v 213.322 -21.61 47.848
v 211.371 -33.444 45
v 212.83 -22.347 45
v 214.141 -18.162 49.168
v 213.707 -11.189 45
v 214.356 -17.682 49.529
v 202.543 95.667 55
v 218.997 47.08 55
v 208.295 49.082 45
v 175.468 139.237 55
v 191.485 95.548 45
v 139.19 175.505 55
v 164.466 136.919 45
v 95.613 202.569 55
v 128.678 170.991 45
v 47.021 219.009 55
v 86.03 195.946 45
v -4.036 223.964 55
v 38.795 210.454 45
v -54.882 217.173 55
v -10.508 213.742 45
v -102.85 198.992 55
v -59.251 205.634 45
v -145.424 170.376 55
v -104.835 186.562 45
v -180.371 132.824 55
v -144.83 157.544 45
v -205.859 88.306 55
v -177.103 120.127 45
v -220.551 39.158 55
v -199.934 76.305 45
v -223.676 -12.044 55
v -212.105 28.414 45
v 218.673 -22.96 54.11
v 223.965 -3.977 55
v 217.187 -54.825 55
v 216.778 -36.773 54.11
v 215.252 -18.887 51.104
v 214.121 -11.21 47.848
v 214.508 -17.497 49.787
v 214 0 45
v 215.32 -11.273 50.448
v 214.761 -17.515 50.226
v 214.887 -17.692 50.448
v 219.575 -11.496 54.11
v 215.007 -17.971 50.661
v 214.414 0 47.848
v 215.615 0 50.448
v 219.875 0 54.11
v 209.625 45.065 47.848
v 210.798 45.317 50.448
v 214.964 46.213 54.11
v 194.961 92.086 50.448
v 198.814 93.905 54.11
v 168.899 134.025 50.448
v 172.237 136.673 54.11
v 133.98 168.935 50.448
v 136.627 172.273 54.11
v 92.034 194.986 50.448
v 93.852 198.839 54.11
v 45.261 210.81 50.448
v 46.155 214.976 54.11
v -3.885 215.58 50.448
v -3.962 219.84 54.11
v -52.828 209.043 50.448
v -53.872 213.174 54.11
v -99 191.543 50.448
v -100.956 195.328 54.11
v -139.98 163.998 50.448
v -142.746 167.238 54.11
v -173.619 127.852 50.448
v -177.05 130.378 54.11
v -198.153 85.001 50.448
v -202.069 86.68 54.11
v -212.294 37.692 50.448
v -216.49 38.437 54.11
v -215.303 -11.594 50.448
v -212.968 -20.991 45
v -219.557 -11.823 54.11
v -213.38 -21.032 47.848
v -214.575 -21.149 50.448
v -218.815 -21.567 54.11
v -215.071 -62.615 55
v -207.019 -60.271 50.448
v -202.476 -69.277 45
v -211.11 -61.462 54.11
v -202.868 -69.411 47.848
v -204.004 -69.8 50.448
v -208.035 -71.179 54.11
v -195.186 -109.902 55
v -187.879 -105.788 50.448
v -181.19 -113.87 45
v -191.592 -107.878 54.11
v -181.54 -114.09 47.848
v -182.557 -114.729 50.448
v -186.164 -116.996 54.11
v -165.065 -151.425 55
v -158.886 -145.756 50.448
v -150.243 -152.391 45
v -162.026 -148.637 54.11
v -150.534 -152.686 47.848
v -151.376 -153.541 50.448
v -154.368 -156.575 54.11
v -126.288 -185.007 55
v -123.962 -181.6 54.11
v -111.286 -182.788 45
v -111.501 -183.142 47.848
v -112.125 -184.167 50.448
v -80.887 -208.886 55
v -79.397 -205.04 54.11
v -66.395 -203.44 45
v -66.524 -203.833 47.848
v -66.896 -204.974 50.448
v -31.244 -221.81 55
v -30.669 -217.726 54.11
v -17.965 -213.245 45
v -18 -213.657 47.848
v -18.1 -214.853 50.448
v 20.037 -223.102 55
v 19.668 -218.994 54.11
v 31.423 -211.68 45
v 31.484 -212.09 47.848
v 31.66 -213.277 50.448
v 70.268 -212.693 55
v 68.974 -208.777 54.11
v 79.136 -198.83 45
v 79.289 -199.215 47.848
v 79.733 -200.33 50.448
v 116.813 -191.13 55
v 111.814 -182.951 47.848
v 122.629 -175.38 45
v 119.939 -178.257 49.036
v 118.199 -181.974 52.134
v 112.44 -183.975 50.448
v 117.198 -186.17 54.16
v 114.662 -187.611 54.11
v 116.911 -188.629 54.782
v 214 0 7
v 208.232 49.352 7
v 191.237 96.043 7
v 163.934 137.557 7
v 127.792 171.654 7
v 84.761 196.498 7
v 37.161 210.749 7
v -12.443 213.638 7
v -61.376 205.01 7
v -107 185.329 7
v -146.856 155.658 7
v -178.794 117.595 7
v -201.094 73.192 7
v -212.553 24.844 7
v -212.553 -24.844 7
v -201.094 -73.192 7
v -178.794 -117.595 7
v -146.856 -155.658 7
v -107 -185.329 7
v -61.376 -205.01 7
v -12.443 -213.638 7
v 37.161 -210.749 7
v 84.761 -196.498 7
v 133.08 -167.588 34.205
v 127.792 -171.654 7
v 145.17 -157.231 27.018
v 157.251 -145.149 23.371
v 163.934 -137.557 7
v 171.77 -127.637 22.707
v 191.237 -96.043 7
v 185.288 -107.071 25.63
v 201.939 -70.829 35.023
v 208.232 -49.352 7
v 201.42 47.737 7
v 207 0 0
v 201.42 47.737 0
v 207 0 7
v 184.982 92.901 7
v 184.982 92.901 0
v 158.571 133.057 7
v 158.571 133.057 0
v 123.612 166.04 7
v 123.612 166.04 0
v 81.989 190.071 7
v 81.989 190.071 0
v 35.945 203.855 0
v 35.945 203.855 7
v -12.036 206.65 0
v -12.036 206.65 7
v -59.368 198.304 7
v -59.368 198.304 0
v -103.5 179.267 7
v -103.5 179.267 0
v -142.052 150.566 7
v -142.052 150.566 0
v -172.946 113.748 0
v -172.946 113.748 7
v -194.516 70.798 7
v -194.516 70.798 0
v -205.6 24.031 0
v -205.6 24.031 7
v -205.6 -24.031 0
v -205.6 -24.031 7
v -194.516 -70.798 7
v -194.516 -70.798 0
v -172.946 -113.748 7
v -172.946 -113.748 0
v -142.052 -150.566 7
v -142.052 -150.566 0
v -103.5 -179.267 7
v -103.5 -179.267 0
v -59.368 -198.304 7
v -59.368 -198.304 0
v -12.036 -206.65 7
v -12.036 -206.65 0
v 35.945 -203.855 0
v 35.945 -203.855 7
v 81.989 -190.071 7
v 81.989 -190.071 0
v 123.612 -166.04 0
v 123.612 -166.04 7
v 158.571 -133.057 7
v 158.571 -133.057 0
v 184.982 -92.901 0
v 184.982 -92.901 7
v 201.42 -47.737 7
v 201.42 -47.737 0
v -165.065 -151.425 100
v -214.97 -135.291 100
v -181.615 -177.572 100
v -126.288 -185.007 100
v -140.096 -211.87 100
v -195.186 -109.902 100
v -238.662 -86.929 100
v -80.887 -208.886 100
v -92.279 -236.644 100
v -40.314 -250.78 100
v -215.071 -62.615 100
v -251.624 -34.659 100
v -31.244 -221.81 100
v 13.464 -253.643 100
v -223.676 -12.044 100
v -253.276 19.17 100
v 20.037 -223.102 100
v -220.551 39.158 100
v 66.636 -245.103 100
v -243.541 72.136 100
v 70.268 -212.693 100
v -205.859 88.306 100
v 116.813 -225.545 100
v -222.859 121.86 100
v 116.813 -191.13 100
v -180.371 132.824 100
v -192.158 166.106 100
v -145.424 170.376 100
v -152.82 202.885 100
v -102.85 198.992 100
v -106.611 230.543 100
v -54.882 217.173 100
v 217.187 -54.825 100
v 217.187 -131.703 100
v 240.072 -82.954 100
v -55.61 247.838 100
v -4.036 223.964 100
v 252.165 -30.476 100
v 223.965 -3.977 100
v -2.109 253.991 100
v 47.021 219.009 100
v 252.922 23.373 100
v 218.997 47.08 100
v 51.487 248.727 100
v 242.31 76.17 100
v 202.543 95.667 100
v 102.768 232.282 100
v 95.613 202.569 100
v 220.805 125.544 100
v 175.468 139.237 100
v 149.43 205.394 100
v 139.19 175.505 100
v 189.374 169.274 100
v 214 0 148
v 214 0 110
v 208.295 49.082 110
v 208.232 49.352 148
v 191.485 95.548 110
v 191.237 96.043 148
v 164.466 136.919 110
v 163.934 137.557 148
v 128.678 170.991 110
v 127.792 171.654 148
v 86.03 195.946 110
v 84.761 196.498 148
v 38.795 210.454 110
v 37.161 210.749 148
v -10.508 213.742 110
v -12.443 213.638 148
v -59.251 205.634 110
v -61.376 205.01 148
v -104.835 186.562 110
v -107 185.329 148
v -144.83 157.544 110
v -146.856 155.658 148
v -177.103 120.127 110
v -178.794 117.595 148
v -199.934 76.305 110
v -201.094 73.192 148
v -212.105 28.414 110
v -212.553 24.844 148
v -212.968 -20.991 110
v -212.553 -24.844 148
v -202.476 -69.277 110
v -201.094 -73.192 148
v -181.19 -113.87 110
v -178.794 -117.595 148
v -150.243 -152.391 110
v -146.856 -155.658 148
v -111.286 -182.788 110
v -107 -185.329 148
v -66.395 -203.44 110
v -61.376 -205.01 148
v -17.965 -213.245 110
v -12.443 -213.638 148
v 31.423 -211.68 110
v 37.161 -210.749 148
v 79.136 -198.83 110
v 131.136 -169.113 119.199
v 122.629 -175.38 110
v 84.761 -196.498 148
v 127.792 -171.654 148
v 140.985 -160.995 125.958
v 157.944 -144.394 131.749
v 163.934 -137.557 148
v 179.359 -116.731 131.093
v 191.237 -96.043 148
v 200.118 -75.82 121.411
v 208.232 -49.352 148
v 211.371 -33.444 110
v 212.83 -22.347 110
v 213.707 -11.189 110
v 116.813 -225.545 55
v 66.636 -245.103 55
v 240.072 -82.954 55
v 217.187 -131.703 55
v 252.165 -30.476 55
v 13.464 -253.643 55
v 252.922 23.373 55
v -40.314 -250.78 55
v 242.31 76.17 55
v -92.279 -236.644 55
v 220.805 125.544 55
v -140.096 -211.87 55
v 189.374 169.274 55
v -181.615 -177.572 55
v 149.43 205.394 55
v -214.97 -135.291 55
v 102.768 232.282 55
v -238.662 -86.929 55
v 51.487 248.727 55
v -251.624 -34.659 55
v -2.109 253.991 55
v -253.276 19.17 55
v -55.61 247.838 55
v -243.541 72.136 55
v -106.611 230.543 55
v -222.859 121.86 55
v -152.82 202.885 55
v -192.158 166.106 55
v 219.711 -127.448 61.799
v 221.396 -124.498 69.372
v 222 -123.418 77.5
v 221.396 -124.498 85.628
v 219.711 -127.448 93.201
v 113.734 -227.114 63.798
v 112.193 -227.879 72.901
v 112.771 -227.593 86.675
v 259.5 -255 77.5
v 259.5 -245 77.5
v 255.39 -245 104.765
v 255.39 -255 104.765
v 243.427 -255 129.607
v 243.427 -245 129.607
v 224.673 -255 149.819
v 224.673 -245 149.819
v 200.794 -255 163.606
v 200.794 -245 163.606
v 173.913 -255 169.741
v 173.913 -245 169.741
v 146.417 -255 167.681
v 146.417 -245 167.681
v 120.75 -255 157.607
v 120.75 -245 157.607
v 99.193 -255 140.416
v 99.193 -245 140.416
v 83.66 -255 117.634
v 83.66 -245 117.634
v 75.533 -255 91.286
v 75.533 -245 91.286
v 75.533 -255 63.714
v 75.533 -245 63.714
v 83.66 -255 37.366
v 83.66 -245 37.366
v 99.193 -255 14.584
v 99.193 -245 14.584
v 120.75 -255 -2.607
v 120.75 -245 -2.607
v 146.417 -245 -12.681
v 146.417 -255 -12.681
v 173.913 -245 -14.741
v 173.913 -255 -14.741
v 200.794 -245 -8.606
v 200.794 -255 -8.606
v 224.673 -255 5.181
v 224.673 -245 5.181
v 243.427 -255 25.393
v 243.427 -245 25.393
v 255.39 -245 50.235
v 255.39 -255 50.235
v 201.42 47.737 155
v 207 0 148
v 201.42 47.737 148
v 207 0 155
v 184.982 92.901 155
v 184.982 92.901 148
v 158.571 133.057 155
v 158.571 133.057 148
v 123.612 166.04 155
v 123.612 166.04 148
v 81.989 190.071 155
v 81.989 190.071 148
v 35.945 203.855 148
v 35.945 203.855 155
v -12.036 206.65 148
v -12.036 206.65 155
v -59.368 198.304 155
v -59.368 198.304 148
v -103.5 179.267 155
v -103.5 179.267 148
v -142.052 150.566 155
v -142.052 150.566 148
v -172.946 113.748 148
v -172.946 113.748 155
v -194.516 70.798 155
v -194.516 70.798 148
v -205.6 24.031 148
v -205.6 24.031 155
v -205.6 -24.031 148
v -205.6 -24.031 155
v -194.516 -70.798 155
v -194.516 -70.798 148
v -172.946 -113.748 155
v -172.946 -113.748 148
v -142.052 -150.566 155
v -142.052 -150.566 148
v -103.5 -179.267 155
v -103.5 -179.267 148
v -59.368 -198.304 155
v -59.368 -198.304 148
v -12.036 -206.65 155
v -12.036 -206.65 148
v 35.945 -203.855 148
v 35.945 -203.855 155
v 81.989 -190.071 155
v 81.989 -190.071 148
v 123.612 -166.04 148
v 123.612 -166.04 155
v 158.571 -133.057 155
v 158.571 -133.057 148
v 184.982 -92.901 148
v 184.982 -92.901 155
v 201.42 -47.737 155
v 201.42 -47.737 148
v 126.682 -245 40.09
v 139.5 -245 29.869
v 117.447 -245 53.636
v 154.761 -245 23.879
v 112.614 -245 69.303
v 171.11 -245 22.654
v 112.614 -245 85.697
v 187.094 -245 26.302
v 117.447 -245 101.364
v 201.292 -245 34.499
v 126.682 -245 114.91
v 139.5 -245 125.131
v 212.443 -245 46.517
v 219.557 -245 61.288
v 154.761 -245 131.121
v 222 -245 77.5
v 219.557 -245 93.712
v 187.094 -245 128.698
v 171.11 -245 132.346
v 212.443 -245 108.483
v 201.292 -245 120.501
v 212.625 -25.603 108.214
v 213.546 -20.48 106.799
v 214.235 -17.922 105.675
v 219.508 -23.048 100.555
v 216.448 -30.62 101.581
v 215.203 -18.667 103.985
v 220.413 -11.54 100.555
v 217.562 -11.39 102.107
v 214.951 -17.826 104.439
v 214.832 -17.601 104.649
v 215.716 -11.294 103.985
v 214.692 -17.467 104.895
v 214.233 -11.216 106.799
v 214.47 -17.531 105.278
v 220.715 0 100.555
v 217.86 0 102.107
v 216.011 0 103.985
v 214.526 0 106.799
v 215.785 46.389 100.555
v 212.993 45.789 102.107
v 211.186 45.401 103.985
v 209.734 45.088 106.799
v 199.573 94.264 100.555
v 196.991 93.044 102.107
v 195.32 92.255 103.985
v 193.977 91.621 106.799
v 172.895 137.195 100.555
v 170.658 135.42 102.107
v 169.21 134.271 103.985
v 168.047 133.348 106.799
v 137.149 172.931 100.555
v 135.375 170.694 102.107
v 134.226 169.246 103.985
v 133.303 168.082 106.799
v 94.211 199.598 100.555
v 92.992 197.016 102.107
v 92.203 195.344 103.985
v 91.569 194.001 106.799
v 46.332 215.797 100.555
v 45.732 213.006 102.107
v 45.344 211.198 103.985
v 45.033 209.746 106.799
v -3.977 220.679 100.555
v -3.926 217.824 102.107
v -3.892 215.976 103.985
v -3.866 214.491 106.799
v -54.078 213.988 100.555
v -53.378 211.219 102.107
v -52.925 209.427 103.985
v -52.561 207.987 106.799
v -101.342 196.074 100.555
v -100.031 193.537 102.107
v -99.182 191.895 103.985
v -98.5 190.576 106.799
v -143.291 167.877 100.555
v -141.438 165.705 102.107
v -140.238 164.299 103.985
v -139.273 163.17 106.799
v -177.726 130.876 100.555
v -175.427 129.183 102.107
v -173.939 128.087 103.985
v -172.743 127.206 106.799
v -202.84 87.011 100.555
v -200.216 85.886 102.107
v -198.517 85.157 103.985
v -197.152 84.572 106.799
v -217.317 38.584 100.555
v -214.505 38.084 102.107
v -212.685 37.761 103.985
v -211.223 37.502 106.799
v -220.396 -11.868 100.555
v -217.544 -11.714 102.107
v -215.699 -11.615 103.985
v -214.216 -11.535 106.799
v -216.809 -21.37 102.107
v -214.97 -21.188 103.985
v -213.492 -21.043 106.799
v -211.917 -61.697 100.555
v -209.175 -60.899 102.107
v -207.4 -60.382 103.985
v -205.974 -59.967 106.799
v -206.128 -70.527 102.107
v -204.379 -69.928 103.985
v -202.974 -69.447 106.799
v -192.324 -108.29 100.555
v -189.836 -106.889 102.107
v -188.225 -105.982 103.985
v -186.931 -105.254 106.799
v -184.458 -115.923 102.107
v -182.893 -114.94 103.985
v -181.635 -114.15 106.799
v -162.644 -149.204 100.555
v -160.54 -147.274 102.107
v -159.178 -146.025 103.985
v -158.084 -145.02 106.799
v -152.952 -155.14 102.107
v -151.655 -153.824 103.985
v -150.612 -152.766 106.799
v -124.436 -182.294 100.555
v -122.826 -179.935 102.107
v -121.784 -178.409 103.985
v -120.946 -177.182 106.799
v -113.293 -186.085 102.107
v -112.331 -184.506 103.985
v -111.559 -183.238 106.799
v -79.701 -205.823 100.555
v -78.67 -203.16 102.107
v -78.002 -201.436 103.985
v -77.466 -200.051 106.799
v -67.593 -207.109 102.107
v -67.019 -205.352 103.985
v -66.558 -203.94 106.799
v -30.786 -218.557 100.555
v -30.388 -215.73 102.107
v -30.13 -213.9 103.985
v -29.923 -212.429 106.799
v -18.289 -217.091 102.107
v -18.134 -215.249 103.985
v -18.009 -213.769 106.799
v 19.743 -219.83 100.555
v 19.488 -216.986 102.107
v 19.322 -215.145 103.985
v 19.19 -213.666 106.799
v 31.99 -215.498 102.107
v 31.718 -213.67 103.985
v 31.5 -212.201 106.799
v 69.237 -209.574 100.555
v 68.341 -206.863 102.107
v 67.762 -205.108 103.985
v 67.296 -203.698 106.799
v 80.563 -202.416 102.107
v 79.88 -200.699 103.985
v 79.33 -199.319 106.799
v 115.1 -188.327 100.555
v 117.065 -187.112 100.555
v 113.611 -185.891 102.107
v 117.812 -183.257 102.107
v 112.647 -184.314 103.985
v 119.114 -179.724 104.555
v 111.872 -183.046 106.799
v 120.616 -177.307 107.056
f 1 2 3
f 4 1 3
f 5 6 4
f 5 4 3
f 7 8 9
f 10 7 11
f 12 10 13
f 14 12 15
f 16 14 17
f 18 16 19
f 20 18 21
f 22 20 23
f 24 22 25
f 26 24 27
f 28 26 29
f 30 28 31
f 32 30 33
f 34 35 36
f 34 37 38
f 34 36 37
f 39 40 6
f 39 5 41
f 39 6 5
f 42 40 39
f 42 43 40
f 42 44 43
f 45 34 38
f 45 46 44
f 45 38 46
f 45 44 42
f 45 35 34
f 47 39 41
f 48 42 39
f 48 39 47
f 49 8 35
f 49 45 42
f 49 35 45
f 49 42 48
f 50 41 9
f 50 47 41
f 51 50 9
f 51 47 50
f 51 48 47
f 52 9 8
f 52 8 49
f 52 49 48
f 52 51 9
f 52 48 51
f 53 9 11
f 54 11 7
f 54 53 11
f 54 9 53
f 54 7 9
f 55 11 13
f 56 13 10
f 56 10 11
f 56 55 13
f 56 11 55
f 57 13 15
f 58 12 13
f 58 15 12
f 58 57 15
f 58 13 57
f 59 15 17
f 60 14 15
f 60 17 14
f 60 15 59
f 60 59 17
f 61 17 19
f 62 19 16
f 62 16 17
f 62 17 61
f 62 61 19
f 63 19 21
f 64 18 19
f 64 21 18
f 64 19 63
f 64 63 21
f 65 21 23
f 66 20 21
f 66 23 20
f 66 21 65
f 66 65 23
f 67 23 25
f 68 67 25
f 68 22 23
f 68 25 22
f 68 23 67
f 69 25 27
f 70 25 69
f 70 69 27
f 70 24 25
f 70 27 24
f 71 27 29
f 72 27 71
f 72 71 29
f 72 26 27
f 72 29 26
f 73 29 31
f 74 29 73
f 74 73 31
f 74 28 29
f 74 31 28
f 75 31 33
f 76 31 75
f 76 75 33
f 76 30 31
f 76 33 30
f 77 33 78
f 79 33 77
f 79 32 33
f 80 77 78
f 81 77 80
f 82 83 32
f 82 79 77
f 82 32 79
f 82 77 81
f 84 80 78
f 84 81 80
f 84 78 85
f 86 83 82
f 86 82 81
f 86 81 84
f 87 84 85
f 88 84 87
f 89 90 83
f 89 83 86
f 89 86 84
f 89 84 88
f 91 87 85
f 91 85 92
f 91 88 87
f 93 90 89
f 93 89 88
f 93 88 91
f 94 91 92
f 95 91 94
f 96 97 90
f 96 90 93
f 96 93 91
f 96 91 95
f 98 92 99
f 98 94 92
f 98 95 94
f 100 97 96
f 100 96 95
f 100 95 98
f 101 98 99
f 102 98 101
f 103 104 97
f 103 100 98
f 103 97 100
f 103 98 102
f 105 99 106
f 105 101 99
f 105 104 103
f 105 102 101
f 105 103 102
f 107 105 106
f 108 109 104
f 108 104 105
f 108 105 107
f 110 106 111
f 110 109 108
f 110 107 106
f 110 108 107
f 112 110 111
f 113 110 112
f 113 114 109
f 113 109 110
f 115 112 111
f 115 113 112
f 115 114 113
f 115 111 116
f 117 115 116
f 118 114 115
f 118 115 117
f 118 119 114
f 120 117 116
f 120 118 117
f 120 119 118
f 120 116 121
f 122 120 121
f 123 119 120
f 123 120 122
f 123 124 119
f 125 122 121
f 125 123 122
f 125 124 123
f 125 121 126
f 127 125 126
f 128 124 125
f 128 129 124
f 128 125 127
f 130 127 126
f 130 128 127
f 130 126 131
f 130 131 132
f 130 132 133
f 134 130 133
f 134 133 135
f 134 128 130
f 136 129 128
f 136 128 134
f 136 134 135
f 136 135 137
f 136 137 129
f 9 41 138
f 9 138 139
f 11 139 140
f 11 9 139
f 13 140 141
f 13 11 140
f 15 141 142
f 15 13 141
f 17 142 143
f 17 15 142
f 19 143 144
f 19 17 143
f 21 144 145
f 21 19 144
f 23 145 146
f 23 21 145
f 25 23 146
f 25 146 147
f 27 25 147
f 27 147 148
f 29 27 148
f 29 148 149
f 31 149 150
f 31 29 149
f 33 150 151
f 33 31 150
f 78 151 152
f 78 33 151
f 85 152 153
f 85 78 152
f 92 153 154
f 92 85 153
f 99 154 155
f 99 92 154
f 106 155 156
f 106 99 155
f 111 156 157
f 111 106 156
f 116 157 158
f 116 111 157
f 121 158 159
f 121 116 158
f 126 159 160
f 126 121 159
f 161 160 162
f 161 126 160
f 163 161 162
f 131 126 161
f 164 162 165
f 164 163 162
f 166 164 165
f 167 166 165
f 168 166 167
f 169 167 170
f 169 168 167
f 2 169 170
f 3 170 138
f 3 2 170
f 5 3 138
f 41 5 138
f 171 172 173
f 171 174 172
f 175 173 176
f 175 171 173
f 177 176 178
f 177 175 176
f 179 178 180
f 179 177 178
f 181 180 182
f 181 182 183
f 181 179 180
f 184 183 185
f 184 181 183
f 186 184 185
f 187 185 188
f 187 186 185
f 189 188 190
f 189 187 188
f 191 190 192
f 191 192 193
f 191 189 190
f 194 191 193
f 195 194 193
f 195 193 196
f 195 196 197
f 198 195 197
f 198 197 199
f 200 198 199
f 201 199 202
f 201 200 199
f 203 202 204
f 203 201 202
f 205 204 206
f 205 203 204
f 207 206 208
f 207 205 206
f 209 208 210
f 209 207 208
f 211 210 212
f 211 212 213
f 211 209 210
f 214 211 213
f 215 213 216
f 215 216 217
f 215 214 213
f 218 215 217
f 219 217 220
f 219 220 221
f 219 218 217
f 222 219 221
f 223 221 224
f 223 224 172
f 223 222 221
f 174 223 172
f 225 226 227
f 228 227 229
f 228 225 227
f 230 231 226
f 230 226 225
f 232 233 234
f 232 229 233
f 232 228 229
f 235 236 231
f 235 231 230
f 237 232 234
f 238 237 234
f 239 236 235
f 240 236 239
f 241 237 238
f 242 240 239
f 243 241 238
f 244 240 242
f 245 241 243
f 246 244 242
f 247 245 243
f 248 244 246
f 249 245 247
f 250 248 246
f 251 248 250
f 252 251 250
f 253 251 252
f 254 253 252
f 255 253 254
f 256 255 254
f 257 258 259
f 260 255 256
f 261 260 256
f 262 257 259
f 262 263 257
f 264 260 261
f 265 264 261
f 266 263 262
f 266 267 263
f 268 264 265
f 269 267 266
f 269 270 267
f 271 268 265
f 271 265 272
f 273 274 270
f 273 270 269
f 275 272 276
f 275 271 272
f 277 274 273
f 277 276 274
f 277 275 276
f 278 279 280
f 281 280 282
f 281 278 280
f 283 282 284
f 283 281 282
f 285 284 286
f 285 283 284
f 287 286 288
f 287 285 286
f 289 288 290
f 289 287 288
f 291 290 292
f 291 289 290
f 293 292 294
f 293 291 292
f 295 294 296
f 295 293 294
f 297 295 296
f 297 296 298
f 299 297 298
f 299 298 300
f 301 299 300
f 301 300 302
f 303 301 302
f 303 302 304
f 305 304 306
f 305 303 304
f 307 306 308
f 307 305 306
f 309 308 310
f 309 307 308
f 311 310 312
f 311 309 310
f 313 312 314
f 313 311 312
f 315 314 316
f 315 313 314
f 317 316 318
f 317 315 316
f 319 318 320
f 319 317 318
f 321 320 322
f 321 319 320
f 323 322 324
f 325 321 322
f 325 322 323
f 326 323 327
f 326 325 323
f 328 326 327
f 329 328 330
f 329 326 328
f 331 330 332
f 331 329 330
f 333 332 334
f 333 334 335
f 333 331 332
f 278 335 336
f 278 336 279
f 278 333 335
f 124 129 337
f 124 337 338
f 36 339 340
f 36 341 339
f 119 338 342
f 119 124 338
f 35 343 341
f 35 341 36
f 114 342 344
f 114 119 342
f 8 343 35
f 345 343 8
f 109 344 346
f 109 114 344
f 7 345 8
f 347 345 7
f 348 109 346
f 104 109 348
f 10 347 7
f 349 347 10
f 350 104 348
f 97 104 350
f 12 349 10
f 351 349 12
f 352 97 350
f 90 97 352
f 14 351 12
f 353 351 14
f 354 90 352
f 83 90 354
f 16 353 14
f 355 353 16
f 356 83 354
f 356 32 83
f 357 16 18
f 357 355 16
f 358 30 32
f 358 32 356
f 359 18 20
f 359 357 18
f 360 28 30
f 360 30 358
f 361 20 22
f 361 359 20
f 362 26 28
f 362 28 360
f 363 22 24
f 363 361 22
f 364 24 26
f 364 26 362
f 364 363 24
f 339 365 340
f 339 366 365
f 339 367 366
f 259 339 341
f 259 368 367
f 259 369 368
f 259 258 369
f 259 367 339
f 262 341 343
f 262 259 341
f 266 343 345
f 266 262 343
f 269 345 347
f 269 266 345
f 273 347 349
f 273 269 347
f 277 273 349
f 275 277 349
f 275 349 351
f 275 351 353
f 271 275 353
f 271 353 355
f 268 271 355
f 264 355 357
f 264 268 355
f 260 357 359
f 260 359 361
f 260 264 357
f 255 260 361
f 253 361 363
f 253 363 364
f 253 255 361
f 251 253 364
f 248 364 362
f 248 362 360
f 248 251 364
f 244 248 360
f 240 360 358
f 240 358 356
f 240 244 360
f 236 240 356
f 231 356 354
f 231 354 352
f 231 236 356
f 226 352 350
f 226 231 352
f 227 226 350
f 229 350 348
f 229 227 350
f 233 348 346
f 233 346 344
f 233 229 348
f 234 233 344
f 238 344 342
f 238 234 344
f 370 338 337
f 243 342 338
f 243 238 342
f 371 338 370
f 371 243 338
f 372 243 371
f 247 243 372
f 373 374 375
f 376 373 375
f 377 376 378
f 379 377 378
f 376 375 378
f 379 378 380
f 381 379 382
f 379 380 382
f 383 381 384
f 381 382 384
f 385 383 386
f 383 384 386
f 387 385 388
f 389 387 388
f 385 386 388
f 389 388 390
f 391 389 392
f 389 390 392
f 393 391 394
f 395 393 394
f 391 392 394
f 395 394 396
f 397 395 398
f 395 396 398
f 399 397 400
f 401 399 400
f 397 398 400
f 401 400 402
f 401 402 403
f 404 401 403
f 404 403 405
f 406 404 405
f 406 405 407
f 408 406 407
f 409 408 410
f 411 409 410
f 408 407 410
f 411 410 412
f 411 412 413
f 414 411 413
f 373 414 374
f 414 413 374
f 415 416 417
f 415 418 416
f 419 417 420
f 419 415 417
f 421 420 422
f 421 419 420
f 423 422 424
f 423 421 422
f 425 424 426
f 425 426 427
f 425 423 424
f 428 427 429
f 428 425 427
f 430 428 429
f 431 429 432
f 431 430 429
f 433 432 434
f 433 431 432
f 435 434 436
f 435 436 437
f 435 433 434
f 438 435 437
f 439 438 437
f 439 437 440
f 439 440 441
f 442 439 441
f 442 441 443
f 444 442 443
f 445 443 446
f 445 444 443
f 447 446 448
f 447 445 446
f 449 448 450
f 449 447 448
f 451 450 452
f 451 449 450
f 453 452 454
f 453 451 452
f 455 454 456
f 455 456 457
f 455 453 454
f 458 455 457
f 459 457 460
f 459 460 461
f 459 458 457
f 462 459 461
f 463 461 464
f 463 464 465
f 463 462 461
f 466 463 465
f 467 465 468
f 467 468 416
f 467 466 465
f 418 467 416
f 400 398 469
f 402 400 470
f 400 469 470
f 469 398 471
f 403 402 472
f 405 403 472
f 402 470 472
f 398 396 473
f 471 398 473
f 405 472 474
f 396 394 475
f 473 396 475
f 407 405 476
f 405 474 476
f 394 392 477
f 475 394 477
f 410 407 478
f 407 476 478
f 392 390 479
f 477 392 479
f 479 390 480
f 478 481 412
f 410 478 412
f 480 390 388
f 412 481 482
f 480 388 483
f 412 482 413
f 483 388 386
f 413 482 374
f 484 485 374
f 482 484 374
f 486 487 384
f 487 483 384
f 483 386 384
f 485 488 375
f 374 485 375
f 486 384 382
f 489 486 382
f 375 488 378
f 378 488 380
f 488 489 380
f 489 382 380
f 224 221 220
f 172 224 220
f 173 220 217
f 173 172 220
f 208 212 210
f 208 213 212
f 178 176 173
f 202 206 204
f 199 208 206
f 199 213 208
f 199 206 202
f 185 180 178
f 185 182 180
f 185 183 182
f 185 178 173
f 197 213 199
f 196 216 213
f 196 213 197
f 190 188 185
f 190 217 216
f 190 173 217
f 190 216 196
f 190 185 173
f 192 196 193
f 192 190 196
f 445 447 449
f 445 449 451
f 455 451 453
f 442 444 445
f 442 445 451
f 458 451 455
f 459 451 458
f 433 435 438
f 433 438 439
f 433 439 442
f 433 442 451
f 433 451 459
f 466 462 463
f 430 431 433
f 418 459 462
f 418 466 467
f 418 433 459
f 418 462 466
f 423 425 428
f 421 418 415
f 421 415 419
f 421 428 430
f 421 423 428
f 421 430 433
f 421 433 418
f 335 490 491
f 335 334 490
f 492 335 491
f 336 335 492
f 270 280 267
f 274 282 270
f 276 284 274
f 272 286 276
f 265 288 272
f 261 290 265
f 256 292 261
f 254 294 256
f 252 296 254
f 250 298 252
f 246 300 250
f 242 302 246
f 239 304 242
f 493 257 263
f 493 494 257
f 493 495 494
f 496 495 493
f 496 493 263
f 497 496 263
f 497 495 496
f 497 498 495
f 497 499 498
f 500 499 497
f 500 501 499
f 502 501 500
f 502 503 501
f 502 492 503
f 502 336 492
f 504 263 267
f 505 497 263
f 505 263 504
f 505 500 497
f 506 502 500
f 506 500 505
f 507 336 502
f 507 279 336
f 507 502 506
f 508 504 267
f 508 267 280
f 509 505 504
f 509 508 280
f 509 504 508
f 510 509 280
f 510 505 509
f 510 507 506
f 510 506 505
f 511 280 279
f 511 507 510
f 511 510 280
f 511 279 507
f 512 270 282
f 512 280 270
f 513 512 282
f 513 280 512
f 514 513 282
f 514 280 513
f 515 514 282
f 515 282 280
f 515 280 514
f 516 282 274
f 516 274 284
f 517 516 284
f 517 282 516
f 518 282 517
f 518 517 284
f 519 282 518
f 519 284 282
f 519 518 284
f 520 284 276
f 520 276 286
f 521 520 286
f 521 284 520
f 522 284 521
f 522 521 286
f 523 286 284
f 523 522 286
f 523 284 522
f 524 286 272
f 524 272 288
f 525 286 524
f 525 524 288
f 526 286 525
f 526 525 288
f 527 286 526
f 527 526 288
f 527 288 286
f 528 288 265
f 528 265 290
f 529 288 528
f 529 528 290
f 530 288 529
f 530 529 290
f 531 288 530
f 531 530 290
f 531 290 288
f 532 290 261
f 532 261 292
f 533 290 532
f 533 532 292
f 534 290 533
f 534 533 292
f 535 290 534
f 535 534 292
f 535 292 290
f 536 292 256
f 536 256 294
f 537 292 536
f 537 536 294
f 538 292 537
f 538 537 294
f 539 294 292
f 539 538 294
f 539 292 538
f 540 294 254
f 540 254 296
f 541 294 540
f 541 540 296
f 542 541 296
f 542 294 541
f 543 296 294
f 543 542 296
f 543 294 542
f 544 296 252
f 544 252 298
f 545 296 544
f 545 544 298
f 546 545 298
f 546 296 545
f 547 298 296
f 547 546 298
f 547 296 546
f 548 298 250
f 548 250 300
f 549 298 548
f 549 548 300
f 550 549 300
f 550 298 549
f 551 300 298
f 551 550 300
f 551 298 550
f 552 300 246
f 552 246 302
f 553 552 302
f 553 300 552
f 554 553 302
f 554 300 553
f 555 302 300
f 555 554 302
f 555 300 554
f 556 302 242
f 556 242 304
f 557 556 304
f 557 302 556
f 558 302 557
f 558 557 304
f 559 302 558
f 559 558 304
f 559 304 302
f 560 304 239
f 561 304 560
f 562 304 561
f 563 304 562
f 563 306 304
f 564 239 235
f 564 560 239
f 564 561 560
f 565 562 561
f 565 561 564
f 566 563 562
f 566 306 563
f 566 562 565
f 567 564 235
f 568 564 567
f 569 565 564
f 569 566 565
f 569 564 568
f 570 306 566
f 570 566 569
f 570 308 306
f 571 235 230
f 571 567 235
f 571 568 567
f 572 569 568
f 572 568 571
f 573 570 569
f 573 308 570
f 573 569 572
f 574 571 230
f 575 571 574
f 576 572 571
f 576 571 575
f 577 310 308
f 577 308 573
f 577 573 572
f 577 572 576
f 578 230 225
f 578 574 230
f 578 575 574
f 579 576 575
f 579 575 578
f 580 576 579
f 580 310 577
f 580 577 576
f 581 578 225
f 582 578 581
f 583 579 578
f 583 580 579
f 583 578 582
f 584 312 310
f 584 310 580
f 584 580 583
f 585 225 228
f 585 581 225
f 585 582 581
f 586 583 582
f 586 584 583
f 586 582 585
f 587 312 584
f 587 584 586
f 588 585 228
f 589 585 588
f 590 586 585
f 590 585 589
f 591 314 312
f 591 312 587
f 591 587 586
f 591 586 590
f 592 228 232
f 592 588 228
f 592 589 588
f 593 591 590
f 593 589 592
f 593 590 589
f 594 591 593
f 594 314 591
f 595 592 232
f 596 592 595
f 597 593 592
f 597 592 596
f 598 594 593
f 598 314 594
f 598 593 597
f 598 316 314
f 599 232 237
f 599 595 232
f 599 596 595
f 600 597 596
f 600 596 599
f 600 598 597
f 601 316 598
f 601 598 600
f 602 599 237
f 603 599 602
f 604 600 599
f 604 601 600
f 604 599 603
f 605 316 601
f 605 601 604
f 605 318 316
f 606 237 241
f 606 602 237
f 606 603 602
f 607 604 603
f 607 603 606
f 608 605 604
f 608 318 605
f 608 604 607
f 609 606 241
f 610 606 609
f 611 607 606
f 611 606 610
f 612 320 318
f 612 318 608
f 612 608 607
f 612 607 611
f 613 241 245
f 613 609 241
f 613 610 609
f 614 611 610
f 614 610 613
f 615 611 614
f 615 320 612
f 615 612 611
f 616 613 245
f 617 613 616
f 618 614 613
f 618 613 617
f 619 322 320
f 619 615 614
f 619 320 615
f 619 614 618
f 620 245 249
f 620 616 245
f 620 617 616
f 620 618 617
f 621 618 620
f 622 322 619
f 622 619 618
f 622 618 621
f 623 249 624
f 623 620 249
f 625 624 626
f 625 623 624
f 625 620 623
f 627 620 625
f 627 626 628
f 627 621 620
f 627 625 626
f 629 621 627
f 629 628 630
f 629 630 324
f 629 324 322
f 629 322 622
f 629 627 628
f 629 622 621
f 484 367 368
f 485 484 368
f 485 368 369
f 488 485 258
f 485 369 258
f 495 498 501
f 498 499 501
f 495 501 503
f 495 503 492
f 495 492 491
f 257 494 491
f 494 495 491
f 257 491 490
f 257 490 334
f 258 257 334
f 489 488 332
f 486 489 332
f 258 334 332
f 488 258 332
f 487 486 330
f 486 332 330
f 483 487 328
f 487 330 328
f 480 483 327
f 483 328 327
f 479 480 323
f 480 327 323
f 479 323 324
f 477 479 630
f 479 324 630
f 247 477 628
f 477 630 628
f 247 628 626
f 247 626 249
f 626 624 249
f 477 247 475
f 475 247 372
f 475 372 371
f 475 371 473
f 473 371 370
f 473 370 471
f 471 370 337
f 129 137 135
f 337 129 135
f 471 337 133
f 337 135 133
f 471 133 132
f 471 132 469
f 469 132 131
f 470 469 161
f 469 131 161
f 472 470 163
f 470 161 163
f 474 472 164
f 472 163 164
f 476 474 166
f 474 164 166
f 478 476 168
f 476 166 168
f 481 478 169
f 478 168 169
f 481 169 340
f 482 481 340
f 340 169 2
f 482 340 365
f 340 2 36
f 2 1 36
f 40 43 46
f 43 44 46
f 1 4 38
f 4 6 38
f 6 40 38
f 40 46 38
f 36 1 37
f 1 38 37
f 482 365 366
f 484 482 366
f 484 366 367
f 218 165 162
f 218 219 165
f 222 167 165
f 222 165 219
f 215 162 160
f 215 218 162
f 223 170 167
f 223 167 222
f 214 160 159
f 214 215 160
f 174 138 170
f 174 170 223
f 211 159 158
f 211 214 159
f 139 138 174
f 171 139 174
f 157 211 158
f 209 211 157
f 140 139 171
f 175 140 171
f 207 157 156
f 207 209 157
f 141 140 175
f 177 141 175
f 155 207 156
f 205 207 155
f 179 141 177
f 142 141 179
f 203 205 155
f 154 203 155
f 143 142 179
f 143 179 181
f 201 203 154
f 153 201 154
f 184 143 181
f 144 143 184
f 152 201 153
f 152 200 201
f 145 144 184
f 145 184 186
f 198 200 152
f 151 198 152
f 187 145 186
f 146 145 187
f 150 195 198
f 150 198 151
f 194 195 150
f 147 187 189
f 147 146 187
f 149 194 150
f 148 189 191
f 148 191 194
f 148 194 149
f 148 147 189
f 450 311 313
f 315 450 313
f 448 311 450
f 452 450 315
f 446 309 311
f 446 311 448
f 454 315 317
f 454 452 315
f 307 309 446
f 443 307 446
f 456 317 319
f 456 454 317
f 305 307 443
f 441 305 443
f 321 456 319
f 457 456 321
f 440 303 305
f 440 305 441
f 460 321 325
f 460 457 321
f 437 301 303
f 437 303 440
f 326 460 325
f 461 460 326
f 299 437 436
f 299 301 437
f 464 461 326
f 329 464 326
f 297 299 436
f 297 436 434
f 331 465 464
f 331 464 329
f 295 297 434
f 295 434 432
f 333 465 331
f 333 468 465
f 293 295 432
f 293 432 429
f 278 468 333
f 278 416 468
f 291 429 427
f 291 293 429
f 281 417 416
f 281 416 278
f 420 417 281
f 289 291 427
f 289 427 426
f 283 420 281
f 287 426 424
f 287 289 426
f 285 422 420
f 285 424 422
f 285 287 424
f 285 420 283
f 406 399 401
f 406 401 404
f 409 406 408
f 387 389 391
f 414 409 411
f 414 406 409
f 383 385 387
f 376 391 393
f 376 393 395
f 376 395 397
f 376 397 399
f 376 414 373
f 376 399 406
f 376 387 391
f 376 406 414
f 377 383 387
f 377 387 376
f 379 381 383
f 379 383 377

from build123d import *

# Parameters (mm, degrees)
F2_R     = 55
F3_DEPTH = 245
F4_R     = 92.5
F4_R_2   = 55
F5_DEPTH = 10


with BuildPart() as f1:
    # F0 (on Front) → F1 (revolve)
    with BuildSketch(Plane.XZ):
        with BuildLine():
            Line((0, 155), (0, 0))
            Line((0, 0), (207, 0))
            Line((207, 0), (207, 7))
            Line((207, 7), (214, 7))
            Line((214, 7), (214, 45))
            ThreePointArc((214, 45), (216.928932, 52.071068), (224, 55))
            Line((224, 55), (254, 55))
            Line((254, 55), (254, 100))
            Line((254, 100), (224, 100))
            ThreePointArc((224, 100), (216.928932, 102.928932), (214, 110))
            Line((214, 110), (214, 148))
            Line((214, 148), (207, 148))
            Line((207, 148), (207, 155))
            Line((207, 155), (0, 155))
        make_face()
    revolve(axis=Axis((0, 0, 77.5), (0, 0, 1)))

    # F2 (on Front) → F3 (join)
    with BuildSketch(Plane.XZ):
        with Locations((167, 77.5)):
            Circle(F2_R)
    extrude(amount=F3_DEPTH)

    # F4 (on face) → F5 (join)
    with BuildSketch(Plane.XZ.offset(245)):
        with Locations((167, 77.5)):
            Circle(F4_R)
        with Locations((167, 77.5)):
            Circle(F4_R_2, mode=Mode.SUBTRACT)
        with Locations((167, 77.5)):
            Circle(F4_R_2)
    extrude(amount=F5_DEPTH)


solid = f1.part
